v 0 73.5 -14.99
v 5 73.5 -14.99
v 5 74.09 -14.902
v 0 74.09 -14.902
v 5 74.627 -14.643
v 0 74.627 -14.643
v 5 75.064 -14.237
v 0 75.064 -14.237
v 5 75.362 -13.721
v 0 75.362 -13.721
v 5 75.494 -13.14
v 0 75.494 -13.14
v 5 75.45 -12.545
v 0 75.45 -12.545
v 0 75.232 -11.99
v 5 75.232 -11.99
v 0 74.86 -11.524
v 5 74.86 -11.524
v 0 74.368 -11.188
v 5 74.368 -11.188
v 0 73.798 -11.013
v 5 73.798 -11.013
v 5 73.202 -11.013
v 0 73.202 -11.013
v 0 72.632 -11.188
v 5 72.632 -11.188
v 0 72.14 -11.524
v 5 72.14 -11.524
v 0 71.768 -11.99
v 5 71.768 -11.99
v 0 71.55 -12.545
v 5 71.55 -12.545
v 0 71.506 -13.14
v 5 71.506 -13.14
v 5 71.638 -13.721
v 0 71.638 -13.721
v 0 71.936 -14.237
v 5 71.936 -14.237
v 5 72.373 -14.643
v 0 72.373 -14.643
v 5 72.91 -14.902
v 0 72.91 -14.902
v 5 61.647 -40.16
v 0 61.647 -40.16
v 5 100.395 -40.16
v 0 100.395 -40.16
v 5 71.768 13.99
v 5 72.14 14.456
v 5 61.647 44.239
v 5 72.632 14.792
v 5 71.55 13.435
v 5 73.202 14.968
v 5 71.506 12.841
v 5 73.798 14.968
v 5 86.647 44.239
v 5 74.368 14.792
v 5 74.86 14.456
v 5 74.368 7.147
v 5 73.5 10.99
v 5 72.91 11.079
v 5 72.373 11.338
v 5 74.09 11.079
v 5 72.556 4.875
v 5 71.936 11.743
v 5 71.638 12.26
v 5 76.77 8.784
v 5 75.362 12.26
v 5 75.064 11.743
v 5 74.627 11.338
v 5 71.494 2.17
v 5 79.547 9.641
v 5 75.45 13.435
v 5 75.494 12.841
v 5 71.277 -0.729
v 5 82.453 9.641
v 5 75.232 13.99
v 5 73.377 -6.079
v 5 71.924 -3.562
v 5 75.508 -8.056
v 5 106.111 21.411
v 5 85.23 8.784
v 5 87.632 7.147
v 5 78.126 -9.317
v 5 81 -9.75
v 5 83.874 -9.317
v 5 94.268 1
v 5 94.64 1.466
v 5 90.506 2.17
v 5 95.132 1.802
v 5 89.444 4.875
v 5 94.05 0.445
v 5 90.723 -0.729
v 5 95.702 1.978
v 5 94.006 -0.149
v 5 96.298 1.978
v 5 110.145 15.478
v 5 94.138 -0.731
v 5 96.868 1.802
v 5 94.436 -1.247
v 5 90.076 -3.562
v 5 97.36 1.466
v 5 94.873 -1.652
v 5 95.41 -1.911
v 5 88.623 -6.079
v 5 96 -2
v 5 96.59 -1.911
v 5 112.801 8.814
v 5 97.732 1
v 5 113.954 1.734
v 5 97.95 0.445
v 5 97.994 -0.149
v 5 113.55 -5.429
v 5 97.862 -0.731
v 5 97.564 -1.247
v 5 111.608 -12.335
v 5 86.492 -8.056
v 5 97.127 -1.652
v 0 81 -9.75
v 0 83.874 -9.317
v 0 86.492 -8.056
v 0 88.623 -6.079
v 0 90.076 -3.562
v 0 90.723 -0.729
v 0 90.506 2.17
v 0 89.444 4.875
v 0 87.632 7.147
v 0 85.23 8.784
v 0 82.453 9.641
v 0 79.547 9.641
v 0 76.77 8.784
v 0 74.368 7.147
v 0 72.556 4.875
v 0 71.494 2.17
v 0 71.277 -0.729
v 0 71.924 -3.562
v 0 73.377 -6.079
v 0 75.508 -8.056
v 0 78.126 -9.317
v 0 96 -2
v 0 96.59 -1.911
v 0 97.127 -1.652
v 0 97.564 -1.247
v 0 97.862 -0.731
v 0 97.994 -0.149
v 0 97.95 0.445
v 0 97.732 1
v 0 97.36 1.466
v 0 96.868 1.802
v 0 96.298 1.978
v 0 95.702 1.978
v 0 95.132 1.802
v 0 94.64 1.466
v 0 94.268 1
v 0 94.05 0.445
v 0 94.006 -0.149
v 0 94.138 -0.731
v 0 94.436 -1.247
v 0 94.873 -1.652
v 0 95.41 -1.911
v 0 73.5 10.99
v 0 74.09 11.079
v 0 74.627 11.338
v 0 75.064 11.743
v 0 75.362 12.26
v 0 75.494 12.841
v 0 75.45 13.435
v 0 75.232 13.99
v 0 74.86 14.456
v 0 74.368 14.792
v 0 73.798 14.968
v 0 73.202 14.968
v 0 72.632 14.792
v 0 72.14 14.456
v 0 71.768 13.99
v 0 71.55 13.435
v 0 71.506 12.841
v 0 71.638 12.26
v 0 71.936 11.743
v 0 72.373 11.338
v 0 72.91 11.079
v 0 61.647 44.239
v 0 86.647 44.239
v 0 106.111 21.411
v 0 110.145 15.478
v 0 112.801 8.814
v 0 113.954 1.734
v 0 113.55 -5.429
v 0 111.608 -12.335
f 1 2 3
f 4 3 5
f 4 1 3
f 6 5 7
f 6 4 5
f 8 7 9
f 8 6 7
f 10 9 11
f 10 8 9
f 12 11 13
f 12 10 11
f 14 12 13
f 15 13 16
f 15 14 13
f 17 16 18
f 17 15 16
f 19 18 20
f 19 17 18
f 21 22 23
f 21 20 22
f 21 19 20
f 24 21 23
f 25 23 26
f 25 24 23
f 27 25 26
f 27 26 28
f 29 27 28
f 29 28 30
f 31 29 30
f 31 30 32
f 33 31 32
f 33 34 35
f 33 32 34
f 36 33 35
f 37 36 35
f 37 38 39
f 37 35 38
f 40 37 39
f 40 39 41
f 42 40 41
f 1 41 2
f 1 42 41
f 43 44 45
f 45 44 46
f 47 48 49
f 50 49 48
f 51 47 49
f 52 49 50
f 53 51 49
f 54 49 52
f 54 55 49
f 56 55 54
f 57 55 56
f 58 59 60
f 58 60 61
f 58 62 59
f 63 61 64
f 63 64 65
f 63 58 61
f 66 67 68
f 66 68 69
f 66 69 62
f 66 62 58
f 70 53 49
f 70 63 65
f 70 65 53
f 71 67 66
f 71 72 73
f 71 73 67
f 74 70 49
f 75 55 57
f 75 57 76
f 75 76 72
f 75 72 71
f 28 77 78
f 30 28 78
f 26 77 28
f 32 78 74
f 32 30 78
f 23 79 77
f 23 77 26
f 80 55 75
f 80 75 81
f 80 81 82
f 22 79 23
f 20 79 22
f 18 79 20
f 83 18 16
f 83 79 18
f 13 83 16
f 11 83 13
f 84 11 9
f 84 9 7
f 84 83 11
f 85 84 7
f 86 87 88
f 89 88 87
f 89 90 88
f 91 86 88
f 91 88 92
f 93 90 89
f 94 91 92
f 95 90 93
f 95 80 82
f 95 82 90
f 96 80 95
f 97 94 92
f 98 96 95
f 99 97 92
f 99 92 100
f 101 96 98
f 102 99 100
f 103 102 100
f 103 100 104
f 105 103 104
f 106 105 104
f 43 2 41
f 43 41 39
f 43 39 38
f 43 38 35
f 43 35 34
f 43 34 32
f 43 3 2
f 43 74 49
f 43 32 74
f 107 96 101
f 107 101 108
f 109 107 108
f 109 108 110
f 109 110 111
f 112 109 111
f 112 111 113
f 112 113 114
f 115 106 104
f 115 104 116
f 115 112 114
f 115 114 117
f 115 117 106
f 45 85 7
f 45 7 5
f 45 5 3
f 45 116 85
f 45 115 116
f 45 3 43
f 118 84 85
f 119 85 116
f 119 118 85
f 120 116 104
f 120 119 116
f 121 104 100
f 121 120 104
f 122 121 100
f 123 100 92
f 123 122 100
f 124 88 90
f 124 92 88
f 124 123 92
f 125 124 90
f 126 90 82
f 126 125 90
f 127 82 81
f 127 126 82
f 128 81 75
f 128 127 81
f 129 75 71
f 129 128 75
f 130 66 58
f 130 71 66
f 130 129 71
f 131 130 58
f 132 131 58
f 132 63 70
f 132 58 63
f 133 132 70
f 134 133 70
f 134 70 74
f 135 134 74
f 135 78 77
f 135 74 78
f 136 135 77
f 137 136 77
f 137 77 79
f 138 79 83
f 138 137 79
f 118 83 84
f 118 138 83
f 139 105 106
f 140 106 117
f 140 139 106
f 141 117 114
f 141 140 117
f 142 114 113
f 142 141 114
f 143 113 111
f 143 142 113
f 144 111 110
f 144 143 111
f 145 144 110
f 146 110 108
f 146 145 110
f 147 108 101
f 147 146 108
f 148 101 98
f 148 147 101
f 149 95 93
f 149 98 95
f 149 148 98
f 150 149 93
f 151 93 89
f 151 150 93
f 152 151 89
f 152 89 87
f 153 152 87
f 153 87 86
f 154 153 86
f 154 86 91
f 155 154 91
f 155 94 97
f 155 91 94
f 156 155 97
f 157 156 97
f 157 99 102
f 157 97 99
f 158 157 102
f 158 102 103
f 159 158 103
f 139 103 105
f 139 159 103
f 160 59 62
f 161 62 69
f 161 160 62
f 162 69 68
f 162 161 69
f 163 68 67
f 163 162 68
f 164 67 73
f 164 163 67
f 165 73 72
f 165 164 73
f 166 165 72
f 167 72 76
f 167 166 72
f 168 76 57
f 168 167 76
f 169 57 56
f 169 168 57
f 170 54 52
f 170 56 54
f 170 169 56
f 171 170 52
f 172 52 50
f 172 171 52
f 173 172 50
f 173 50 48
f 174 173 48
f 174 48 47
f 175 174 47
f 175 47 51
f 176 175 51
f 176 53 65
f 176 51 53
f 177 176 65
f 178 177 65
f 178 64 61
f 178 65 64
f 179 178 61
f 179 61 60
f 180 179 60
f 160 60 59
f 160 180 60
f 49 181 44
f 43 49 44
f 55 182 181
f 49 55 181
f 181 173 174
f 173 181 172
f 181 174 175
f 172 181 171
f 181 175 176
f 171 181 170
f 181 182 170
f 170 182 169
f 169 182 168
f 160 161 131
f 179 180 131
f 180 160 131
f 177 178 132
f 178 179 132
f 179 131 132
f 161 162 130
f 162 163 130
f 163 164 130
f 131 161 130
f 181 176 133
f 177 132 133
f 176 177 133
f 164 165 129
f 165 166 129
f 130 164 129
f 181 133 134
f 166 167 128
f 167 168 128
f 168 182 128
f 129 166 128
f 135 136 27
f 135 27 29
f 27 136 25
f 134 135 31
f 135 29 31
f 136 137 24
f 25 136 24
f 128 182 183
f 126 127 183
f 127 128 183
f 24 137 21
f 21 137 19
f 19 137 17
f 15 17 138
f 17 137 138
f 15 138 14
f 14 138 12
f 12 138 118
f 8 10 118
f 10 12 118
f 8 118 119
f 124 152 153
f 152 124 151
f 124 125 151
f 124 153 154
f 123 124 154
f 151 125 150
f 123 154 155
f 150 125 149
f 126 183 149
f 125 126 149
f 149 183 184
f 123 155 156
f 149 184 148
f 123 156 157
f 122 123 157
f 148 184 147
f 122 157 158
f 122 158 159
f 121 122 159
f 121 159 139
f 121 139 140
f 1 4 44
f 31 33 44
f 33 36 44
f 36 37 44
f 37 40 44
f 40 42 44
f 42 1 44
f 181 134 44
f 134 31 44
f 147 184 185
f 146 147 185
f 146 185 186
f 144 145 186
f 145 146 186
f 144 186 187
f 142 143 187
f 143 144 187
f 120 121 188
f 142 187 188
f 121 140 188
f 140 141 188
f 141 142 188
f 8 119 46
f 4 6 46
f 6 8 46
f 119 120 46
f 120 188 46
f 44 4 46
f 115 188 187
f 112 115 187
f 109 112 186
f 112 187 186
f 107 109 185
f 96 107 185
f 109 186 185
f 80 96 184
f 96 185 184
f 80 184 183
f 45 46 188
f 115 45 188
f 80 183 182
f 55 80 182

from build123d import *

# Parameters (mm, degrees)
ESTRUSIONE_ESTRUSIONE1_DEPTH = 5
SCHIZZO2_R                   = 4
SCHIZZO2_R_2                 = 2
SCHIZZO2_R_3                 = 9.75
TAGLIO_ESTRUSIONE1_DEPTH     = 6


with BuildPart() as part:
    # Schizzo3 → Estrusione-Estrusione1 (new body)
    with BuildSketch(Plane(origin=(0, 0, 0), x_dir=(0, 0, -1), z_dir=(1, 0, 0))):
        with BuildLine():
            Line((40.160183768, 61.647051924), (40.160183768, 100.394835388))
            Line((40.160183768, 100.394835388), (12.334616938, 111.608123513))
            ThreePointArc((12.334616938, 111.608123513), (-5.305430843, 113.570729245), (-21.410737295, 106.111358555))
            Line((-21.410737295, 106.111358555), (-44.239245072, 86.647051924))
            Line((-44.239245072, 86.647051924), (-44.239245072, 61.647051924))
            Line((-44.239245072, 61.647051924), (40.160183768, 61.647051924))
        make_face()
    extrude(amount=ESTRUSIONE_ESTRUSIONE1_DEPTH)

    # Schizzo2 → Taglio-Estrusione1 (cut, through all)
    with BuildSketch(Plane(origin=(0, 0, 0), x_dir=(0, 0, -1), z_dir=(1, 0, 0))):
        with Locations((-95, 0)):
            Circle(SCHIZZO2_R)
        with Locations((201, 0)):
            Circle(SCHIZZO2_R)
        with Locations((12.990381057, 73.5)):
            Circle(SCHIZZO2_R_2)
        with Locations((-12.990381057, 73.5)):
            Circle(SCHIZZO2_R_2)
        with Locations((0, 96)):
            Circle(SCHIZZO2_R_2)
        with Locations((0, 81)):
            Circle(SCHIZZO2_R_3)
    extrude(amount=TAGLIO_ESTRUSIONE1_DEPTH, mode=Mode.SUBTRACT)


solid = part.part
